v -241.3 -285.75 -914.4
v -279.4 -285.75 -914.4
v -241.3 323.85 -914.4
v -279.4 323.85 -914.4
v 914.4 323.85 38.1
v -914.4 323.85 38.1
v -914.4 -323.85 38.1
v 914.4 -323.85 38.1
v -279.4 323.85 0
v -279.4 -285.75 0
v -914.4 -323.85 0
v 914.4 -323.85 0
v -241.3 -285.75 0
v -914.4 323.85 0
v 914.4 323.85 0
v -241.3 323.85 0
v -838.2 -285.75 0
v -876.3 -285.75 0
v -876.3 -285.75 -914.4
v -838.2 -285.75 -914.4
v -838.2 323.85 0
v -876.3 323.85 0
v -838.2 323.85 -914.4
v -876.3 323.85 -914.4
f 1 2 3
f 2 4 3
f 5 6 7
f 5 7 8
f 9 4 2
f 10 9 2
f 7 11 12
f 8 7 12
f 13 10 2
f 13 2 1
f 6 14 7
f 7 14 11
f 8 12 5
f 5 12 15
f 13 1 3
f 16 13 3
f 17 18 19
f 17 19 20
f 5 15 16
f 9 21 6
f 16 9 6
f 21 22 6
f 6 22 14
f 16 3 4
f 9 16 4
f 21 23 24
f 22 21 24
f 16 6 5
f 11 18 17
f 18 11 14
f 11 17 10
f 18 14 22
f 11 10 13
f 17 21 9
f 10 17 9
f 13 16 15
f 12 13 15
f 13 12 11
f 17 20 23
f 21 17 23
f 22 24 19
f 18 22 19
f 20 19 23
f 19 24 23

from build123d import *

# Parameters (mm, degrees)
F0_W     = 558.8
F0_H     = 374.65
F0_W_2   = 38.1
F0_W_3   = 482.6
F0_H_2   = 19.05
F0_H_3   = 184.15
F0_H_4   = 12.7
F1_DEPTH = 38.1
F2_DEPTH = 914.4
F3_DEPTH = 914.4


with BuildPart() as f1:
    # F0 (on Top) → F1 (new body)
    with BuildSketch(Plane.XY):
        with Locations((558.8, 136.525)):
            Rectangle(F0_W, F0_H)
        with Locations((895.35, 136.525)):
            Rectangle(F0_W_2, F0_H)
        with Locations((-558.8, 136.525)):
            Rectangle(F0_W, F0_H)
        with Locations((-895.35, 136.525)):
            Rectangle(F0_W_2, F0_H)
        with Locations((0, 136.525)):
            Rectangle(F0_W_3, F0_H)
        with Locations((895.35, -60.325)):
            Rectangle(F0_W_2, F0_H_2)
        with Locations((-895.35, -60.325)):
            Rectangle(F0_W_2, F0_H_2)
        with Locations((260.35, 136.525)):
            Rectangle(F0_W_2, F0_H)
        with Locations((895.35, -161.925)):
            Rectangle(F0_W_2, F0_H_3)
        with Locations((-895.35, -263.525)):
            Rectangle(F0_W_2, F0_H_2)
        with Locations((857.25, 136.525)):
            Rectangle(F0_W_2, F0_H)
        Polygon((-914.4, -323.85), (914.4, -323.85), (914.4, -273.05), (876.3, -273.05), (876.3, -285.75), (838.2, -285.75), (838.2, -273.05), (279.4, -273.05), (279.4, -285.75), (241.3, -285.75), (241.3, -273.05), (-241.3, -273.05), (-241.3, -285.75), (-279.4, -285.75), (-279.4, -273.05), (-838.2, -273.05), (-838.2, -285.75), (-876.3, -285.75), (-876.3, -273.05), (-914.4, -273.05), align=None)
        with Locations((-895.35, -161.925)):
            Rectangle(F0_W_2, F0_H_3)
        with Locations((895.35, -263.525)):
            Rectangle(F0_W_2, F0_H_2)
        with Locations((-857.25, 136.525)):
            Rectangle(F0_W_2, F0_H)
        with Locations((-260.35, 136.525)):
            Rectangle(F0_W_2, F0_H)
        with Locations((-558.8, -60.325)):
            Rectangle(F0_W, F0_H_2)
        with Locations((-558.8, -161.925)):
            Rectangle(F0_W, F0_H_3)
        with Locations((-260.35, -161.925)):
            Rectangle(F0_W_2, F0_H_3)
        with Locations((0, -161.925)):
            Rectangle(F0_W_3, F0_H_3)
        with Locations((558.8, -161.925)):
            Rectangle(F0_W, F0_H_3)
        with Locations((260.35, -161.925)):
            Rectangle(F0_W_2, F0_H_3)
        with Locations((857.25, -161.925)):
            Rectangle(F0_W_2, F0_H_3)
        with Locations((558.8, -60.325)):
            Rectangle(F0_W, F0_H_2)
        with Locations((-857.25, -161.925)):
            Rectangle(F0_W_2, F0_H_3)
        with Locations((-857.25, -60.325)):
            Rectangle(F0_W_2, F0_H_2)
        with Locations((-857.25, -263.525)):
            Rectangle(F0_W_2, F0_H_2)
        with Locations((-857.25, -279.4)):
            Rectangle(F0_W_2, F0_H_4)
        with Locations((-558.8, -263.525)):
            Rectangle(F0_W, F0_H_2)
        with Locations((0, -60.325)):
            Rectangle(F0_W_3, F0_H_2)
        with Locations((0, -263.525)):
            Rectangle(F0_W_3, F0_H_2)
        with Locations((-260.35, -263.525)):
            Rectangle(F0_W_2, F0_H_2)
        with Locations((-260.35, -279.4)):
            Rectangle(F0_W_2, F0_H_4)
        with Locations((-260.35, -60.325)):
            Rectangle(F0_W_2, F0_H_2)
        with Locations((260.35, -60.325)):
            Rectangle(F0_W_2, F0_H_2)
        with Locations((260.35, -279.4)):
            Rectangle(F0_W_2, F0_H_4)
        with Locations((260.35, -263.525)):
            Rectangle(F0_W_2, F0_H_2)
        with Locations((558.8, -263.525)):
            Rectangle(F0_W, F0_H_2)
        with Locations((857.25, -60.325)):
            Rectangle(F0_W_2, F0_H_2)
        with Locations((857.25, -263.525)):
            Rectangle(F0_W_2, F0_H_2)
        with Locations((857.25, -279.4)):
            Rectangle(F0_W_2, F0_H_4)
    extrude(amount=F1_DEPTH)

    # F0 (on Top) → F2 (join)
    with BuildSketch(Plane.XY):
        with Locations((-260.35, -263.525)):
            Rectangle(F0_W_2, F0_H_2)
        with Locations((-260.35, -60.325)):
            Rectangle(F0_W_2, F0_H_2)
        with Locations((-260.35, -161.925)):
            Rectangle(F0_W_2, F0_H_3)
        with Locations((-260.35, -279.4)):
            Rectangle(F0_W_2, F0_H_4)
        with Locations((-260.35, 136.525)):
            Rectangle(F0_W_2, F0_H)
    extrude(amount=-F2_DEPTH)

    # F0 (on Top) → F3 (join)
    with BuildSketch(Plane.XY):
        with Locations((-857.25, -263.525)):
            Rectangle(F0_W_2, F0_H_2)
        with Locations((-857.25, 136.525)):
            Rectangle(F0_W_2, F0_H)
        with Locations((-857.25, -60.325)):
            Rectangle(F0_W_2, F0_H_2)
        with Locations((-857.25, -279.4)):
            Rectangle(F0_W_2, F0_H_4)
        with Locations((-857.25, -161.925)):
            Rectangle(F0_W_2, F0_H_3)
    extrude(amount=-F3_DEPTH)


solid = f1.part
